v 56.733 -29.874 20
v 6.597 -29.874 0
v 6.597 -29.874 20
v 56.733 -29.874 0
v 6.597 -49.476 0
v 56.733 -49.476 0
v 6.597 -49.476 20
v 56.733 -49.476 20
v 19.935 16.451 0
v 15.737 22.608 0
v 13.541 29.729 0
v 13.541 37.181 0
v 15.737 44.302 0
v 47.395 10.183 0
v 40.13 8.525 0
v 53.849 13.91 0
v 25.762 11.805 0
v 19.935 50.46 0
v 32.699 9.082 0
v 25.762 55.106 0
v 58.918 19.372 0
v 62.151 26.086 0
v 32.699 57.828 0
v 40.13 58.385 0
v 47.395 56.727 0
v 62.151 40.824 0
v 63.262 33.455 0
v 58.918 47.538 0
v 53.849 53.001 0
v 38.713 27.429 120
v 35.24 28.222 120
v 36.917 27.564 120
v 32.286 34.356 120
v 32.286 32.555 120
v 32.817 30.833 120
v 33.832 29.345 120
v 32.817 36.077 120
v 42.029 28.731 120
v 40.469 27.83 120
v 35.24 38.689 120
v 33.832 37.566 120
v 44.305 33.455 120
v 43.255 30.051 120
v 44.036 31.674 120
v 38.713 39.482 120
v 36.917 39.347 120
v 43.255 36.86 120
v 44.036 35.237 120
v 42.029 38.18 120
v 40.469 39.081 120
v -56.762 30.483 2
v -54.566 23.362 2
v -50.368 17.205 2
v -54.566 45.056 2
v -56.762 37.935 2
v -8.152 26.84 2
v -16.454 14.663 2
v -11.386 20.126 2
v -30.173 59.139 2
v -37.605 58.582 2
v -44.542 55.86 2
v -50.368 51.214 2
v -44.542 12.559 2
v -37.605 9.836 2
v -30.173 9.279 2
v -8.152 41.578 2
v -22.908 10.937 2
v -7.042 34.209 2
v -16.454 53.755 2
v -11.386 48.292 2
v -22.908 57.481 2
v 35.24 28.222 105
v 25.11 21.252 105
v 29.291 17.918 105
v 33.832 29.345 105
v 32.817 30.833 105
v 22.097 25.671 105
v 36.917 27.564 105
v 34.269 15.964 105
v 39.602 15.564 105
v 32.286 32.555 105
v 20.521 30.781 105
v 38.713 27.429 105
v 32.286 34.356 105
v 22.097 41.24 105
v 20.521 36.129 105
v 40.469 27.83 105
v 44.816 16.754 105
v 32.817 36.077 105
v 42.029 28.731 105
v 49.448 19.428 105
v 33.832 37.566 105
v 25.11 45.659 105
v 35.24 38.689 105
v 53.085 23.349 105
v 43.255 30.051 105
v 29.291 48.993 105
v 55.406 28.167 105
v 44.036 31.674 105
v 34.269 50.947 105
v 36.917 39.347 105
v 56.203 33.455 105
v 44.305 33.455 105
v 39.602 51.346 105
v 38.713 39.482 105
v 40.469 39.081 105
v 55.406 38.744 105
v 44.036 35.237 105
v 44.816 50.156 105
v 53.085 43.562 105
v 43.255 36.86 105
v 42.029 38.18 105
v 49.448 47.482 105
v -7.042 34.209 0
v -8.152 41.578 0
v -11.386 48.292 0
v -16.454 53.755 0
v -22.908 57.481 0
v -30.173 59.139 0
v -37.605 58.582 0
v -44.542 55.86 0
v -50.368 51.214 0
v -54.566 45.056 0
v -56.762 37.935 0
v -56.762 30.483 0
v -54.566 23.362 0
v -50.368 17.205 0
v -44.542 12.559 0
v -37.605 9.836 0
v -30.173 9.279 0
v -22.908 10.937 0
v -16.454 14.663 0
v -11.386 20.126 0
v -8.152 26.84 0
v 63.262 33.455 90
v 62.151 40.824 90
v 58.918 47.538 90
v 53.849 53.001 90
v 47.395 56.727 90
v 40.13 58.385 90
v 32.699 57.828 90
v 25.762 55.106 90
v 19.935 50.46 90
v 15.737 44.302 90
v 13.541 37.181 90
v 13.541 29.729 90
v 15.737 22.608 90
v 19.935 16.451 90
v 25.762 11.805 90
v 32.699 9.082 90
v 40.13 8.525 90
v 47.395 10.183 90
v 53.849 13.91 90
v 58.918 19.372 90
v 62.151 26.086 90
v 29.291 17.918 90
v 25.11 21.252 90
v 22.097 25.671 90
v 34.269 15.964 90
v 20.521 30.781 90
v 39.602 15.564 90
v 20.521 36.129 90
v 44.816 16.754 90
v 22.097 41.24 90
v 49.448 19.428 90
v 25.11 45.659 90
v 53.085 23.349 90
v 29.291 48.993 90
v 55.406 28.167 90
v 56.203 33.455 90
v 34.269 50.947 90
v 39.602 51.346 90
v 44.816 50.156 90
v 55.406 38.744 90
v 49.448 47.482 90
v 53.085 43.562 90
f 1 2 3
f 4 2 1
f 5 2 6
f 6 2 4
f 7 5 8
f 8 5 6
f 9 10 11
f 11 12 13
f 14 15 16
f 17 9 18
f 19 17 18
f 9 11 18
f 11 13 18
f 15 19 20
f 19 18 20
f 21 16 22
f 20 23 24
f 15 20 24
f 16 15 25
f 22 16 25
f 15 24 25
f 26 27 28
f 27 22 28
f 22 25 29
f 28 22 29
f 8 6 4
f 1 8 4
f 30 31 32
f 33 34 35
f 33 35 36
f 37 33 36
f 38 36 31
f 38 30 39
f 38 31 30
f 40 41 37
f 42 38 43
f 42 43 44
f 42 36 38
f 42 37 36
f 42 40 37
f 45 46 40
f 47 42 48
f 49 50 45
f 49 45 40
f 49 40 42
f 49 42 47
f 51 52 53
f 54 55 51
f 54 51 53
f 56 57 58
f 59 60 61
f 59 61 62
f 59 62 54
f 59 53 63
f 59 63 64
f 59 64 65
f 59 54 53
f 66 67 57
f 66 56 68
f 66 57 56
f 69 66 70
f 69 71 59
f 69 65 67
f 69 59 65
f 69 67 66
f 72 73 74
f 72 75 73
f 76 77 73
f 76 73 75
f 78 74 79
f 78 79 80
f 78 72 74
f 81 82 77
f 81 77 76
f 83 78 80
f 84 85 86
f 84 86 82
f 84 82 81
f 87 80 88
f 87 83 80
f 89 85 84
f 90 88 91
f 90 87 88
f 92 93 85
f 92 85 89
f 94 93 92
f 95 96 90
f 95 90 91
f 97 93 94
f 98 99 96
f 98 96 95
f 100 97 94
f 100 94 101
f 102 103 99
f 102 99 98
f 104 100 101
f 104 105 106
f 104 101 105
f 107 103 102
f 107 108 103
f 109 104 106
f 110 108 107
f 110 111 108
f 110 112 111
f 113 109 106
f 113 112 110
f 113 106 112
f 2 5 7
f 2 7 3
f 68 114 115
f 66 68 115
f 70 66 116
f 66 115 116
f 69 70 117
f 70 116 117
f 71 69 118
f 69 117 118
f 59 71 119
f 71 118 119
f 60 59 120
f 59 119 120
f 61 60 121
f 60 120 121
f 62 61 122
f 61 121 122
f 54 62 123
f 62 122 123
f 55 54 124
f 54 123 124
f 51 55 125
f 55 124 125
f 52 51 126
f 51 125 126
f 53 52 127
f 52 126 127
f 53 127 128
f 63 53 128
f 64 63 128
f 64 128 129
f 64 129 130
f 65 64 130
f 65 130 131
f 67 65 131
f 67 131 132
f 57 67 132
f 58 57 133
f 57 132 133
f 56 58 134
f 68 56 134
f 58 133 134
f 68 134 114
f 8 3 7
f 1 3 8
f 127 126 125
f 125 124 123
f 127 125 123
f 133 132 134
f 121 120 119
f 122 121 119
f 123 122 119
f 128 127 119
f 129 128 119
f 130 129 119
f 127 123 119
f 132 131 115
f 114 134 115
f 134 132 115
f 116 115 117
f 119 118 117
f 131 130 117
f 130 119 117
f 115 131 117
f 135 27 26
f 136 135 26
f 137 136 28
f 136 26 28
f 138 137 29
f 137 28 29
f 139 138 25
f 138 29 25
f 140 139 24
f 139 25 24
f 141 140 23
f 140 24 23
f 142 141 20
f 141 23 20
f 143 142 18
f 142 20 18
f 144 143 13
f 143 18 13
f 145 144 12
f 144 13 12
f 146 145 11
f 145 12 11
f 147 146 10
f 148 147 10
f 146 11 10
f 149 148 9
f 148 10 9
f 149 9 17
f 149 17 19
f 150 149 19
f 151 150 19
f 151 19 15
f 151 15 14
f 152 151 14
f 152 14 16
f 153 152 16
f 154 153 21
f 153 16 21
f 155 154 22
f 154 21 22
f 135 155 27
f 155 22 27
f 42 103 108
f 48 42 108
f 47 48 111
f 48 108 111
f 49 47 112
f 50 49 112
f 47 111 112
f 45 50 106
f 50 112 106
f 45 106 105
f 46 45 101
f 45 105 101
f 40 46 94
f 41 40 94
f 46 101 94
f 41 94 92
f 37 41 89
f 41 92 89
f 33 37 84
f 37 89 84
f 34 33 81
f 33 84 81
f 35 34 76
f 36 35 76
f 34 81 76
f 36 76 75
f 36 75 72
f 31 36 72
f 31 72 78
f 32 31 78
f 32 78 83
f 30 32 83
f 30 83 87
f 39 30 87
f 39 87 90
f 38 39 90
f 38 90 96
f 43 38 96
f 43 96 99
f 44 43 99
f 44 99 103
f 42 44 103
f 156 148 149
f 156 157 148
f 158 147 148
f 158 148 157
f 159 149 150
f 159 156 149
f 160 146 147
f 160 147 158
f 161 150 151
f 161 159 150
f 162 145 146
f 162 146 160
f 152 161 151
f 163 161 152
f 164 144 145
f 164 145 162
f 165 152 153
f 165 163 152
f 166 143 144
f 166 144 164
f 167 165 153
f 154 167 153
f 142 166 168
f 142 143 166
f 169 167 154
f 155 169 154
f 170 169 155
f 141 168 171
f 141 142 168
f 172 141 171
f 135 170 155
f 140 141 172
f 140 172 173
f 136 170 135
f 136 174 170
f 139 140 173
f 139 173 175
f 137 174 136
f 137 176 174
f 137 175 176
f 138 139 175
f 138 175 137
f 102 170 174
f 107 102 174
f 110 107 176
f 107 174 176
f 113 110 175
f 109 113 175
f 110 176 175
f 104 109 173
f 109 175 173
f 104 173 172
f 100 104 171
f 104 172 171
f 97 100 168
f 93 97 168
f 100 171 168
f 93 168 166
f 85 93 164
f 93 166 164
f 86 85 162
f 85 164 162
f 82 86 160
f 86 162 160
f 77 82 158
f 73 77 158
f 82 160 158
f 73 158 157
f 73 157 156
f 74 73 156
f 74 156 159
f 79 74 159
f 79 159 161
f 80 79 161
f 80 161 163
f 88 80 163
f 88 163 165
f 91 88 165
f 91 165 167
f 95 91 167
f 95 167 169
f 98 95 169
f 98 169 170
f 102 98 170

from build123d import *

# Parameters (mm, degrees)
F0_R     = 25
F2_DEPTH = 2
F3_R     = 25
F3_R_2   = 17.9413304425
F4_DEPTH = 90
F3_R_3   = 6.0431477175
F5_DEPTH = 105
F6_DEPTH = 120
F7_W     = 50.1358308829
F7_H     = 19.6019802243
F8_DEPTH = 20


# Not quite as in the source:
# - the program builds the solid bodies; features that only make, move or delete a surface that nothing else refers to are left out


with BuildPart() as f2:
    # F0 (on Top) → F2 (new body)
    with BuildSketch(Plane.XY):
        with Locations((-32.0416949689, 34.2092253268)):
            Circle(F0_R)
    extrude(amount=F2_DEPTH)


with BuildPart() as f4:
    # F3 (on Top) → F4 (new body)
    with BuildSketch(Plane.XY):
        with Locations((38.2615588605, 33.4553010762)):
            Circle(F3_R)
        with Locations((38.2615588605, 33.4553010762)):
            Circle(F3_R_2, mode=Mode.SUBTRACT)
    extrude(amount=F4_DEPTH)

    # F3 (on Top) → F5 (join)
    with BuildSketch(Plane.XY):
        with Locations((38.2615588605, 33.4553010762)):
            Circle(F3_R_2)
        with Locations((38.2615588605, 33.4553010762)):
            Circle(F3_R_3, mode=Mode.SUBTRACT)
    extrude(amount=F5_DEPTH)

    # F3 (on Top) → F6 (join)
    with BuildSketch(Plane.XY):
        with Locations((38.2615588605, 33.4553010762)):
            Circle(F3_R_3)
    extrude(amount=F6_DEPTH)


with BuildPart() as f8:
    # F7 (on Top) → F8 (new body)
    with BuildSketch(Plane.XY):
        with Locations((31.6647354048, -39.6751603112)):
            Rectangle(F7_W, F7_H)
    extrude(amount=F8_DEPTH)


solid = Compound([f2.part, f4.part, f8.part])
